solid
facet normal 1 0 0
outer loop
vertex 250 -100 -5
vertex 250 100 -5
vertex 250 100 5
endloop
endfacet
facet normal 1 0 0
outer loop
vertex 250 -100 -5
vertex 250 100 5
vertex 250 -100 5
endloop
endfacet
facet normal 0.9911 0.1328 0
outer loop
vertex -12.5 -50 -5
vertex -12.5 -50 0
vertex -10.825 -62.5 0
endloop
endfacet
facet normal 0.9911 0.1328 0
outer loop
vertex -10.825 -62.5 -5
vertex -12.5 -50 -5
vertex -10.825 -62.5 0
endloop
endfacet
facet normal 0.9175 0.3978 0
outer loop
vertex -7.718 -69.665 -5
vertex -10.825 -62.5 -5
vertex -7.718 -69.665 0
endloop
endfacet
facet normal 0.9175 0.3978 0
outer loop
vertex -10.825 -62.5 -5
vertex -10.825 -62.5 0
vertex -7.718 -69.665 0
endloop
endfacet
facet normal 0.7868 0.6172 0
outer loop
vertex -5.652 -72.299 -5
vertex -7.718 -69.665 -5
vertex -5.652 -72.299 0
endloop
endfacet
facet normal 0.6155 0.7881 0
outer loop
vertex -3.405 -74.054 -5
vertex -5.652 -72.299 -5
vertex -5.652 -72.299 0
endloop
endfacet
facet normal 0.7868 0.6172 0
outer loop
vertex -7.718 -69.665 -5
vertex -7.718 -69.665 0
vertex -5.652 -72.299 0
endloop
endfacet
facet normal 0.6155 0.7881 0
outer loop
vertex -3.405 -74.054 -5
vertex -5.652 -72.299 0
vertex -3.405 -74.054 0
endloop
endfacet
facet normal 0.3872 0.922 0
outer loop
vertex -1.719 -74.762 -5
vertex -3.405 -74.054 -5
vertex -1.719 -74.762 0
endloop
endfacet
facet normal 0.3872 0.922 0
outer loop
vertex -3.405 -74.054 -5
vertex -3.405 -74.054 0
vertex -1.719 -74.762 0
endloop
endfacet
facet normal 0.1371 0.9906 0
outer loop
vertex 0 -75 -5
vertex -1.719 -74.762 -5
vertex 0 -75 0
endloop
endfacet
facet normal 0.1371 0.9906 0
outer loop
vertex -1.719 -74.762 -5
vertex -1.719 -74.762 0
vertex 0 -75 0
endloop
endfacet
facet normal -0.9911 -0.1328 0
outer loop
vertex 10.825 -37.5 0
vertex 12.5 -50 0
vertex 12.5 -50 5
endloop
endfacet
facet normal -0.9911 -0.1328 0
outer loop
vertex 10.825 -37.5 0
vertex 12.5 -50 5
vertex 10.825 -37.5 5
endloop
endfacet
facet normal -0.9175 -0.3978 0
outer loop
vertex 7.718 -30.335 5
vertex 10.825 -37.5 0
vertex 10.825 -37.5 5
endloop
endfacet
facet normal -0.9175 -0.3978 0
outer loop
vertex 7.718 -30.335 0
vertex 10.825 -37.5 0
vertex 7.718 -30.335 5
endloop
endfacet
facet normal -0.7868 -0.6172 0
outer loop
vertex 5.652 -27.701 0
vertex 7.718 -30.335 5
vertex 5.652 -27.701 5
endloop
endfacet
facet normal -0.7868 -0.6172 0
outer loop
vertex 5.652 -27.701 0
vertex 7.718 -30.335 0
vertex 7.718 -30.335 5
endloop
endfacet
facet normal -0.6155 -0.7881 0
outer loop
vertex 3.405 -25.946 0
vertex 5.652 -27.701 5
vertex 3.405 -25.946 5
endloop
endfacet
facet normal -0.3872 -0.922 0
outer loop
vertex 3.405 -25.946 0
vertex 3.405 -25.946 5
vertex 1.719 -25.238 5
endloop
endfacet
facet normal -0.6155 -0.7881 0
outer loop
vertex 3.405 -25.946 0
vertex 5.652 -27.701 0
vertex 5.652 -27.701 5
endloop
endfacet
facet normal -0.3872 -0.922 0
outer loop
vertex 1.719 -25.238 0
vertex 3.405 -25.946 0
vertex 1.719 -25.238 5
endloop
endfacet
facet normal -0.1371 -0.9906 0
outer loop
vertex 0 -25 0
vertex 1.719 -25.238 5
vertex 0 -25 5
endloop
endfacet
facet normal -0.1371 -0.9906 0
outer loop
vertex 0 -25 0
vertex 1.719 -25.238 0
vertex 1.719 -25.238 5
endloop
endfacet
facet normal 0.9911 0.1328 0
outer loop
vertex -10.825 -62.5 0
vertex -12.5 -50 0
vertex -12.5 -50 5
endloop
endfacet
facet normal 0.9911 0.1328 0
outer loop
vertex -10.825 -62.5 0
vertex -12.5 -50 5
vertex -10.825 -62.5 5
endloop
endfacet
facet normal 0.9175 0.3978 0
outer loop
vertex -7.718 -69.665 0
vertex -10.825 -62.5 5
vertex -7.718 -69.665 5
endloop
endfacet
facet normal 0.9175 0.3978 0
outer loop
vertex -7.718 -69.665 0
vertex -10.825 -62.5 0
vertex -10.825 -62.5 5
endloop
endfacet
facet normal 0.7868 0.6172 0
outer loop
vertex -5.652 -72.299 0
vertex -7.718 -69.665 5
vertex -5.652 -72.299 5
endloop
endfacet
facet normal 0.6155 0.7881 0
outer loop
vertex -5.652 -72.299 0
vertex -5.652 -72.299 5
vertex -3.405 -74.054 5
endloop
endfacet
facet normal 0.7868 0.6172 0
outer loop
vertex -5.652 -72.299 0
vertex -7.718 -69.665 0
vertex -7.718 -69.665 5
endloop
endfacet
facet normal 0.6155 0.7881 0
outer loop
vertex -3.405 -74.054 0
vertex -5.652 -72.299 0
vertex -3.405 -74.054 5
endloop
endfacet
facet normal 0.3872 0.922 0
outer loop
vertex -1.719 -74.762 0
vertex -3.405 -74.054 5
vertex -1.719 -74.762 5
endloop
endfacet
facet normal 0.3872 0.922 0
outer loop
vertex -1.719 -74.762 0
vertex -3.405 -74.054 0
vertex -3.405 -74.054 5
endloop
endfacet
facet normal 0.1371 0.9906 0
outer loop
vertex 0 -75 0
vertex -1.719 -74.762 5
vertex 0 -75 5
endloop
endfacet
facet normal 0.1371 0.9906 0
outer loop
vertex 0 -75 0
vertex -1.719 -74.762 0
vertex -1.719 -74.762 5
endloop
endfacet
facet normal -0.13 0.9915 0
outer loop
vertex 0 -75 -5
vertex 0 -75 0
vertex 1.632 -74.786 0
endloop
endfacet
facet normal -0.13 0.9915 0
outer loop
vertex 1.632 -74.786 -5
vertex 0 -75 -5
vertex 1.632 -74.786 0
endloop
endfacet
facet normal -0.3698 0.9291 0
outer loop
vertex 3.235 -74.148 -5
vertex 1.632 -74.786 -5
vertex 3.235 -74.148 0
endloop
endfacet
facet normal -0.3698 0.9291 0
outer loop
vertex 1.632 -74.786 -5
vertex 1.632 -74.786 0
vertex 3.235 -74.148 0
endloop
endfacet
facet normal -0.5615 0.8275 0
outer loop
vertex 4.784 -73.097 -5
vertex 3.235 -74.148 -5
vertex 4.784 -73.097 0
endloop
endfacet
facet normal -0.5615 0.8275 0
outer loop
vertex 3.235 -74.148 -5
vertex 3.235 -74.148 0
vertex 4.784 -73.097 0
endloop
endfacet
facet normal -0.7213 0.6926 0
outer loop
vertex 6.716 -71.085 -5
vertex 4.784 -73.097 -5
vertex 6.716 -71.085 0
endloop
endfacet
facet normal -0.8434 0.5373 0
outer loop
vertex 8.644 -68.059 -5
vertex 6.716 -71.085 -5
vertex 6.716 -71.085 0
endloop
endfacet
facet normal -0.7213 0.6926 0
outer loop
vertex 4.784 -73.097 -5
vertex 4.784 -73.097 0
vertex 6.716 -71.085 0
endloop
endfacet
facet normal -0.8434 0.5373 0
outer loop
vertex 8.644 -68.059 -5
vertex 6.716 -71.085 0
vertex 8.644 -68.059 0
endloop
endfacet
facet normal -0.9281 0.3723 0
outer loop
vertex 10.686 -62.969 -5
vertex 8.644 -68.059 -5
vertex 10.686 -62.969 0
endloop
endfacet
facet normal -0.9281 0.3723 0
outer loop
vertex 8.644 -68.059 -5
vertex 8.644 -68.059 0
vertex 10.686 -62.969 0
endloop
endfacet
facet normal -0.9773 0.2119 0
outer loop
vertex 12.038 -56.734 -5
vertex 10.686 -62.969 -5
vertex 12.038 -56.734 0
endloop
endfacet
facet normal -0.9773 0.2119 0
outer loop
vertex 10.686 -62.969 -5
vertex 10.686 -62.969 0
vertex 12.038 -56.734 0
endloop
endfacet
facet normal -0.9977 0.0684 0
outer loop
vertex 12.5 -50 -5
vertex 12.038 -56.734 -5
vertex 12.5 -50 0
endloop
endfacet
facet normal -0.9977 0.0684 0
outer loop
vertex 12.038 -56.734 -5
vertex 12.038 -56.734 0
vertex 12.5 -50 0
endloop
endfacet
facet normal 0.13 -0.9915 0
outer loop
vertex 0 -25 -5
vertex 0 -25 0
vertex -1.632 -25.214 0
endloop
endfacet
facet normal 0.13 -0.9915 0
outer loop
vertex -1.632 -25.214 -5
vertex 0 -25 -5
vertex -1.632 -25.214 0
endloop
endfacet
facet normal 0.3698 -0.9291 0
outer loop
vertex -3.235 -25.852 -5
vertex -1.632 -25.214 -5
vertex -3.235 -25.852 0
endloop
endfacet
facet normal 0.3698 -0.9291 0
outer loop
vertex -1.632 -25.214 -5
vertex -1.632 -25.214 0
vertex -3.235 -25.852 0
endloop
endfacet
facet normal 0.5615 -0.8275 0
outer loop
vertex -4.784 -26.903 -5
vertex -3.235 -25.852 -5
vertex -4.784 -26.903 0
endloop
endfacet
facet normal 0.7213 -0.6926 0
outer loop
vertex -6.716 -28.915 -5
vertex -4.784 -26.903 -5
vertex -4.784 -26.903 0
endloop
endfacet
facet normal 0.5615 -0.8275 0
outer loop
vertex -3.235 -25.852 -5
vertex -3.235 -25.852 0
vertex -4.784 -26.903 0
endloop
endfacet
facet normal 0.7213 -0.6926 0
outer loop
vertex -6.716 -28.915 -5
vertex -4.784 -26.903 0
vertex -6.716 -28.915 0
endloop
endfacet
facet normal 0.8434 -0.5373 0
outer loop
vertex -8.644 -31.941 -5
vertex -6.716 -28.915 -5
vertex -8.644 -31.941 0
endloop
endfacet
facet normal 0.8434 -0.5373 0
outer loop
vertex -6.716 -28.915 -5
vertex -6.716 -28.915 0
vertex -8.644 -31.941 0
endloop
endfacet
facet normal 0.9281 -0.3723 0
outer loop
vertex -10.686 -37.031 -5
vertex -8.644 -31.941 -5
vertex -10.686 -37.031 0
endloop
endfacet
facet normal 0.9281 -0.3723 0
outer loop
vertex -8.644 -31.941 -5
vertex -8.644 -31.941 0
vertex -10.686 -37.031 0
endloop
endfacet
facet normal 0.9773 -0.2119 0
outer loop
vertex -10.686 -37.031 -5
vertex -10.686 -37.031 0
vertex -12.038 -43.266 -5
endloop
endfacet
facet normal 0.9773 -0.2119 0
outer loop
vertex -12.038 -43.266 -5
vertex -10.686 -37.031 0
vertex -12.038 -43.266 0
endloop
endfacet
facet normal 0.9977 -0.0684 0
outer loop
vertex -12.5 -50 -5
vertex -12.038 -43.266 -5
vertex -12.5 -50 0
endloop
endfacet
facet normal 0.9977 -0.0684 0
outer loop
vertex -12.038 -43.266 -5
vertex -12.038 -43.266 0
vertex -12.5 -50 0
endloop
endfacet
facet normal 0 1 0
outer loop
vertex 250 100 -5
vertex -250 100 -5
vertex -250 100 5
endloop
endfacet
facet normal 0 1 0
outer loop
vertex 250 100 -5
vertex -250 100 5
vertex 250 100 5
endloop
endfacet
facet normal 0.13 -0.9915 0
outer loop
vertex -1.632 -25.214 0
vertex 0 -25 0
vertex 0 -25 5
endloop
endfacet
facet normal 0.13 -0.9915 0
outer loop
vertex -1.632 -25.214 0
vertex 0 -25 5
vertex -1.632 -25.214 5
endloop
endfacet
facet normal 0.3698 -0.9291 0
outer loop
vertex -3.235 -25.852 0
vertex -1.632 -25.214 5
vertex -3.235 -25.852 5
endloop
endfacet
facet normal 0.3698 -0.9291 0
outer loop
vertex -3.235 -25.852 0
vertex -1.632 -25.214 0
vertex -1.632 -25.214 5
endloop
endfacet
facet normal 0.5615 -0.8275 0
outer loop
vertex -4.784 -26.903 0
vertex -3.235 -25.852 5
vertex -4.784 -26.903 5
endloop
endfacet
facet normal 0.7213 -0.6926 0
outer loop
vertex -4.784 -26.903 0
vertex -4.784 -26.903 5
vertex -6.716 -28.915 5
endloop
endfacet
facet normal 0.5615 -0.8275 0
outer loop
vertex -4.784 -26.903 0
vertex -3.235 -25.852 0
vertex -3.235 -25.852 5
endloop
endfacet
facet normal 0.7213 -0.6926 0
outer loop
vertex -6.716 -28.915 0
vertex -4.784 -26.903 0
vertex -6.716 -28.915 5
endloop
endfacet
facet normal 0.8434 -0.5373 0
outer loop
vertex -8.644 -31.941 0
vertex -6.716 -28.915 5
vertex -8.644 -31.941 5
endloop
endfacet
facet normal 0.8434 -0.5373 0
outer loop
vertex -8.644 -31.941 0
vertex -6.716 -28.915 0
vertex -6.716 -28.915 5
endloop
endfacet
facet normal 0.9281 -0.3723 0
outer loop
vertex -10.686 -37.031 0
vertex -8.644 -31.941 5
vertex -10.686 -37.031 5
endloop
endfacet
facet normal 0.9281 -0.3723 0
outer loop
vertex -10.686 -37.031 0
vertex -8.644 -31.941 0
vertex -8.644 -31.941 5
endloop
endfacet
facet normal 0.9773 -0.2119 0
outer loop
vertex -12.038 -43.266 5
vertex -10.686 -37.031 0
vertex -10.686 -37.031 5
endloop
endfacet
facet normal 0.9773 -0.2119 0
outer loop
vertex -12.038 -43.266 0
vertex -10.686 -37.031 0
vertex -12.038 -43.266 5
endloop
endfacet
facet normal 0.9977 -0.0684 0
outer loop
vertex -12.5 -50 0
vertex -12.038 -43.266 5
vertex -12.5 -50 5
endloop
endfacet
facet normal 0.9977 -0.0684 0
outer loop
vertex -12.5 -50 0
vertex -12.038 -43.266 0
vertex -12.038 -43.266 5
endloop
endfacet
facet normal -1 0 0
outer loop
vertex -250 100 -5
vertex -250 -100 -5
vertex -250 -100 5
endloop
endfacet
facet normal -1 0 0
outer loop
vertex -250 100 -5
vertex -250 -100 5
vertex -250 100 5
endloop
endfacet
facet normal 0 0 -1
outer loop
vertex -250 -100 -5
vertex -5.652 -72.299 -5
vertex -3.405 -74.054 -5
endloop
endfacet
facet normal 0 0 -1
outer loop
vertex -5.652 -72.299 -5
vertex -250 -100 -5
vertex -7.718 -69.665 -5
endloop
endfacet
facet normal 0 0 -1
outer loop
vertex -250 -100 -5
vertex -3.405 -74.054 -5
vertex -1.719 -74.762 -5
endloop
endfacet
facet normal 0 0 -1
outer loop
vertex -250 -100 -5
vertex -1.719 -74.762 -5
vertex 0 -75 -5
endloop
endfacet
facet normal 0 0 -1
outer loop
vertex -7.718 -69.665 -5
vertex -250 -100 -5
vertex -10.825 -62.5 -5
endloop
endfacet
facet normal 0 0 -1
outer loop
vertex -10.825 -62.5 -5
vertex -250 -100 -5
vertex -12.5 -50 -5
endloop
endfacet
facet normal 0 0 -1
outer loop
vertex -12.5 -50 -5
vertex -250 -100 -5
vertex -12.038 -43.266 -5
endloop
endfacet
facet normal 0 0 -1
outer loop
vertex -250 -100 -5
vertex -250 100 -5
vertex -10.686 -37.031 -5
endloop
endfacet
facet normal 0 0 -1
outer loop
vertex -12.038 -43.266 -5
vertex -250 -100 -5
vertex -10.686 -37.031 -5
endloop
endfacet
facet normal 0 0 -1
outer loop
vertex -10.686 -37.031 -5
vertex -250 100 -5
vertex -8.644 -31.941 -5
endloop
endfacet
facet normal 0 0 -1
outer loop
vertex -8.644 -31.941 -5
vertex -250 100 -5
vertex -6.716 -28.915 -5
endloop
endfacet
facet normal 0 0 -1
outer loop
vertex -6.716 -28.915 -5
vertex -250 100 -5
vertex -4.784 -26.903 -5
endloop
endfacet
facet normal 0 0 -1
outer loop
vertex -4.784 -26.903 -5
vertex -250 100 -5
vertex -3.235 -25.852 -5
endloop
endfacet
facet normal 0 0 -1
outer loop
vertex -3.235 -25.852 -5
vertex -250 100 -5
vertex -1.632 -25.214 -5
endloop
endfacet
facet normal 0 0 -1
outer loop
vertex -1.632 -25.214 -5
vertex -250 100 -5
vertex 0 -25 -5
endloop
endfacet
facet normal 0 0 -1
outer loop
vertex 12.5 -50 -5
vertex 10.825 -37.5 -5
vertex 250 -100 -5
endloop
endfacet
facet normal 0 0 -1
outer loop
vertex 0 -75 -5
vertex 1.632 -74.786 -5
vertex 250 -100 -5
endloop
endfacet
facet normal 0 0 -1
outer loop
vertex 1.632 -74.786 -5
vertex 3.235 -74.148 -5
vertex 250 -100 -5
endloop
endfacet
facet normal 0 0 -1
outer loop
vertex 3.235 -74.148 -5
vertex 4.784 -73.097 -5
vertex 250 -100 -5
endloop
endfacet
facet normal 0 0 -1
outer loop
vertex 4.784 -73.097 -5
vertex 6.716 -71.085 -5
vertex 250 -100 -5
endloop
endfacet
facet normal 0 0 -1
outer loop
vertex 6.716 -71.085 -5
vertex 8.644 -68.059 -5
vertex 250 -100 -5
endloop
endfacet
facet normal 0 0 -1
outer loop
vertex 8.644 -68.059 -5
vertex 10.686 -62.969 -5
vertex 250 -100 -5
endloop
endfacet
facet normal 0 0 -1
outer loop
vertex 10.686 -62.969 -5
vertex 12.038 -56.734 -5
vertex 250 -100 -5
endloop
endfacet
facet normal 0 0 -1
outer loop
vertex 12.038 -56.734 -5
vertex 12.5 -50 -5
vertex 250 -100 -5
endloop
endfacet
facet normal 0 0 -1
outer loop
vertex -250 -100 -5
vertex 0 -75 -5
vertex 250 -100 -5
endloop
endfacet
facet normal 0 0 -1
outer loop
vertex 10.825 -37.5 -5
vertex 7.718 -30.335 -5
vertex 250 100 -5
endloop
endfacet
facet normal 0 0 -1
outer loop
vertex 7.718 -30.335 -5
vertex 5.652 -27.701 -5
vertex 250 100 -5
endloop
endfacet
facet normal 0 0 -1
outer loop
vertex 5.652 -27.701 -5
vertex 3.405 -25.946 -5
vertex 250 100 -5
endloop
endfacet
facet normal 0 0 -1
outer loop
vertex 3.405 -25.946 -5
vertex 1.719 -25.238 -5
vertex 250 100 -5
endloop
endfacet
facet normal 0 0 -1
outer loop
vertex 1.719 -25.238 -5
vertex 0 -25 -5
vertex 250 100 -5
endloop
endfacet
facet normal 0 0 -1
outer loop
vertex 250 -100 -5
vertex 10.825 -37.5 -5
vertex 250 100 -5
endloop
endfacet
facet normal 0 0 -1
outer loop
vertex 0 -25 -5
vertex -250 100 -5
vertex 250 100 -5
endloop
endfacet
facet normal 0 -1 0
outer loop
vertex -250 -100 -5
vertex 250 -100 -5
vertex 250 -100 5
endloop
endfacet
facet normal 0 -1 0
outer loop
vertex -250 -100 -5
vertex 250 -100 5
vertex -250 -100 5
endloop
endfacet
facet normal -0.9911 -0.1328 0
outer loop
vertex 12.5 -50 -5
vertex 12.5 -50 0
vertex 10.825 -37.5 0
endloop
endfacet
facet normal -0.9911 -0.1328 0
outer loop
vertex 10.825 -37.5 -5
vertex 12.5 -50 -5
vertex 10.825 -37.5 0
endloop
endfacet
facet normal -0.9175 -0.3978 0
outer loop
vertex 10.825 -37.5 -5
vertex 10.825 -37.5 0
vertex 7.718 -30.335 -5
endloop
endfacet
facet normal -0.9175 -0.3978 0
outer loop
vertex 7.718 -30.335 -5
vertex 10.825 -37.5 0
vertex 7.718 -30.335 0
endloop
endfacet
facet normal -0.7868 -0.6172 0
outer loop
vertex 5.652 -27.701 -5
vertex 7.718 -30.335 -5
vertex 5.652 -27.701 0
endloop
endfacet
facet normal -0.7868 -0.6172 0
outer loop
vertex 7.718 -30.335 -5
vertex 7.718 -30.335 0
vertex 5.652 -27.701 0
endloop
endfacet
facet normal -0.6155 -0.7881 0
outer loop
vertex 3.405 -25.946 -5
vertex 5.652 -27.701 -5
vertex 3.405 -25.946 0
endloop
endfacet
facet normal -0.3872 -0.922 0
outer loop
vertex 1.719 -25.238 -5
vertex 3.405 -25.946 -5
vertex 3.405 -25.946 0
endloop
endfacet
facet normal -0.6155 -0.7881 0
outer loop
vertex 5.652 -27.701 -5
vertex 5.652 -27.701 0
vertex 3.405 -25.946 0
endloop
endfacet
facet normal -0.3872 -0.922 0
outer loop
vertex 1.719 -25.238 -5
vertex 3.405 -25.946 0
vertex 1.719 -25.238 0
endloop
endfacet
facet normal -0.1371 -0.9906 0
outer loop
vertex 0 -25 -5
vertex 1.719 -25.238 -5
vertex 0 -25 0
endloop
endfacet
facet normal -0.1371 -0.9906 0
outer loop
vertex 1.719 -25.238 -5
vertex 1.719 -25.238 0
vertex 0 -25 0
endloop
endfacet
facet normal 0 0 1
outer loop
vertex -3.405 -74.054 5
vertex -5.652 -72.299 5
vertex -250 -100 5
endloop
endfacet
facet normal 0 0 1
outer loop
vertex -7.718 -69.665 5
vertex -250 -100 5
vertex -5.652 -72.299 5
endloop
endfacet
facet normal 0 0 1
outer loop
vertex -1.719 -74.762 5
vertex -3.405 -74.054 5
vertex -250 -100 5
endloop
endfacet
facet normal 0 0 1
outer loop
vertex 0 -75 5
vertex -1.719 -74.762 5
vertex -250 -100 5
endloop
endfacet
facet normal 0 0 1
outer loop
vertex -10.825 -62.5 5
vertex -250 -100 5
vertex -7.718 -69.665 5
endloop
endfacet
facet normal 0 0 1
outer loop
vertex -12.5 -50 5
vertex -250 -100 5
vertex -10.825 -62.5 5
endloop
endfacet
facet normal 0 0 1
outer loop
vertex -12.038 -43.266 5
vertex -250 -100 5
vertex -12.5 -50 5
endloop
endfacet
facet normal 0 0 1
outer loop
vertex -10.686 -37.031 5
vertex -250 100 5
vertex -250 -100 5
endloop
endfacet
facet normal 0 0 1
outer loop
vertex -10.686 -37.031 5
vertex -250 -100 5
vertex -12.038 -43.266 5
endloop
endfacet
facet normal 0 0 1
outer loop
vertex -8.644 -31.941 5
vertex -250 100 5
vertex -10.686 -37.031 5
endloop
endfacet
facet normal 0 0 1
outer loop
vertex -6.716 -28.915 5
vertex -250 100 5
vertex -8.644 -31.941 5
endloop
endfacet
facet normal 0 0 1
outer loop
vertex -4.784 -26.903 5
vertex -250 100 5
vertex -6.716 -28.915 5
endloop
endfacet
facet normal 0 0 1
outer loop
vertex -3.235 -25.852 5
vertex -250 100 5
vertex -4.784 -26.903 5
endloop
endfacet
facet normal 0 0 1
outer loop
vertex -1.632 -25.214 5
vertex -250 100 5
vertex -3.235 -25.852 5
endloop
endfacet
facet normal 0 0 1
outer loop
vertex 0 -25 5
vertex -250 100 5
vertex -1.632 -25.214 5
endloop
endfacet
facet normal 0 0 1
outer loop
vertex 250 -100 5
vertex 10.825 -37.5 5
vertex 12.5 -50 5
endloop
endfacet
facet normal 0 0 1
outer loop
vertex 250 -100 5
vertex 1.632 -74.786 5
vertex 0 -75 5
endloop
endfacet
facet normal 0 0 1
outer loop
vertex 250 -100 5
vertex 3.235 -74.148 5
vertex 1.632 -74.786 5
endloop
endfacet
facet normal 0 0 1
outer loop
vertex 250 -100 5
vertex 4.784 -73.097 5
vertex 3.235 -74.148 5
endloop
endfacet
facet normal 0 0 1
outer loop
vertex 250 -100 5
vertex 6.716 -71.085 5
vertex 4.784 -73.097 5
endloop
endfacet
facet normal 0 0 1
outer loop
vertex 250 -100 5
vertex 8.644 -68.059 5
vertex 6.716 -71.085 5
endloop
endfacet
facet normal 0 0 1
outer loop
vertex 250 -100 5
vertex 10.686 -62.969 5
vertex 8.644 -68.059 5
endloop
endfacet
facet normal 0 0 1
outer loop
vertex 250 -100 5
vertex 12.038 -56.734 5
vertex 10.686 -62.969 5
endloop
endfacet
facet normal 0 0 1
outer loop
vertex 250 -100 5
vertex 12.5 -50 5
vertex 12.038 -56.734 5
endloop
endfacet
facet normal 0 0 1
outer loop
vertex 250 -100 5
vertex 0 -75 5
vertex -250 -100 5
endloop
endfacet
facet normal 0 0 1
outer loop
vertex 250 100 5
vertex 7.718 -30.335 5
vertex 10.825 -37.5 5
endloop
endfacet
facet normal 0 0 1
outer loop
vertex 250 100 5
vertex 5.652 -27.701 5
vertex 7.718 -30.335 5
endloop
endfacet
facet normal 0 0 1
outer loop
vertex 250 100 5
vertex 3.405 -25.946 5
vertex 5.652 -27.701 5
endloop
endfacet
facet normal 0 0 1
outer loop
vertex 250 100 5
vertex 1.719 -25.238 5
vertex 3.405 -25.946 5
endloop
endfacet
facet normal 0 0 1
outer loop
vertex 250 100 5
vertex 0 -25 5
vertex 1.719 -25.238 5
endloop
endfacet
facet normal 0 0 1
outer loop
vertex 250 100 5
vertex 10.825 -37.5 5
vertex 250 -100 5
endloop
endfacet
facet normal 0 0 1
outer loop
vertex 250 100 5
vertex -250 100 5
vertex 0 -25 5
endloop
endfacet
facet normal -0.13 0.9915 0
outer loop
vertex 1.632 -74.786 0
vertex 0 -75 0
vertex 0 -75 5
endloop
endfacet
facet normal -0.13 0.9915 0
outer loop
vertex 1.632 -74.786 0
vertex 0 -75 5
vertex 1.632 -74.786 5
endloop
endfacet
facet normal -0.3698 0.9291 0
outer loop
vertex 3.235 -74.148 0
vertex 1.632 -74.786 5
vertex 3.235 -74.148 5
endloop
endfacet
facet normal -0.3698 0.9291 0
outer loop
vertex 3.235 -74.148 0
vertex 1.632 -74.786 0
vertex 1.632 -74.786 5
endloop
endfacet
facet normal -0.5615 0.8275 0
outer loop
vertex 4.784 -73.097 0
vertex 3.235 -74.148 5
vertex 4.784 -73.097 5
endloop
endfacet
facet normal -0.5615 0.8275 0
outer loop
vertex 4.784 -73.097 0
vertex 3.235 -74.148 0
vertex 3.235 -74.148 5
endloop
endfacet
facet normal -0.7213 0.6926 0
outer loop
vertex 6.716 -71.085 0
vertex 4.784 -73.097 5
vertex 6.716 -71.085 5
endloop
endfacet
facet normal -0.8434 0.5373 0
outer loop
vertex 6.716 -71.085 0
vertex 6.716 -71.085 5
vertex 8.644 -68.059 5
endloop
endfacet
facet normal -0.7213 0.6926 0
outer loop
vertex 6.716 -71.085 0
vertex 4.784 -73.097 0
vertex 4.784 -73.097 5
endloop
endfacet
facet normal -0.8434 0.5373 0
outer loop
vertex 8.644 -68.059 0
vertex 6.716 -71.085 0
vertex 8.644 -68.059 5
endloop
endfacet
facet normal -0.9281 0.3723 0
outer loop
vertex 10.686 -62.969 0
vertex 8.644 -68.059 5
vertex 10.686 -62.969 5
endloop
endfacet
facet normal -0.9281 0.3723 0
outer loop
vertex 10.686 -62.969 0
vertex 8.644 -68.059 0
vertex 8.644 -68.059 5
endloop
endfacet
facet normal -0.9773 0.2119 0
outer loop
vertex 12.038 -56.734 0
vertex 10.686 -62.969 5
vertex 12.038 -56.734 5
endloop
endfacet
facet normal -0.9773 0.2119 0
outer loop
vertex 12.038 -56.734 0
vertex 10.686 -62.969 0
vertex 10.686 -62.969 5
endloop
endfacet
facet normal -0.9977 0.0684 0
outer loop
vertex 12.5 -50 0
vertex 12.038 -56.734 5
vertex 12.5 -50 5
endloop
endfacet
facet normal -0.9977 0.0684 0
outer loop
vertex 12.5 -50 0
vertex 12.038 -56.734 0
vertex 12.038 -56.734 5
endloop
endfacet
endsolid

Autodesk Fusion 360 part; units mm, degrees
sketch "Sketch1" plane through (0, 0, 0) normal (0, 0, 1) x (1, 0, 0)
  line L0 (-250, 100) -> (250, 100)
  line L1 (250, 100) -> (250, -100)
  line L2 (250, -100) -> (-250, -100)
  line L3 (-250, -100) -> (-250, 100)
  line L4 (0, 100) -> (0, -100) construction
  line L5 (-250, 0) -> (250, 0) construction
  ellipse E0 centre (0, -50) end of major axis (0, -25) minor radius 12.5
  line L6 (0, -75) -> (0, -25)
  line L7 (12.5, -50) -> (-12.5, -50)
  dimension "Major_Radius" = 25
  dimension "Minor_Radius" = 12.5
  dimension "Total_Width" = 500
  dimension "Total_Height" = 200
  dimension "Hole_Offset" = 50
extrude "Extrude1" add sketch "Sketch1" along normal mid plane 10
equation "Thickness = 1 cm"
